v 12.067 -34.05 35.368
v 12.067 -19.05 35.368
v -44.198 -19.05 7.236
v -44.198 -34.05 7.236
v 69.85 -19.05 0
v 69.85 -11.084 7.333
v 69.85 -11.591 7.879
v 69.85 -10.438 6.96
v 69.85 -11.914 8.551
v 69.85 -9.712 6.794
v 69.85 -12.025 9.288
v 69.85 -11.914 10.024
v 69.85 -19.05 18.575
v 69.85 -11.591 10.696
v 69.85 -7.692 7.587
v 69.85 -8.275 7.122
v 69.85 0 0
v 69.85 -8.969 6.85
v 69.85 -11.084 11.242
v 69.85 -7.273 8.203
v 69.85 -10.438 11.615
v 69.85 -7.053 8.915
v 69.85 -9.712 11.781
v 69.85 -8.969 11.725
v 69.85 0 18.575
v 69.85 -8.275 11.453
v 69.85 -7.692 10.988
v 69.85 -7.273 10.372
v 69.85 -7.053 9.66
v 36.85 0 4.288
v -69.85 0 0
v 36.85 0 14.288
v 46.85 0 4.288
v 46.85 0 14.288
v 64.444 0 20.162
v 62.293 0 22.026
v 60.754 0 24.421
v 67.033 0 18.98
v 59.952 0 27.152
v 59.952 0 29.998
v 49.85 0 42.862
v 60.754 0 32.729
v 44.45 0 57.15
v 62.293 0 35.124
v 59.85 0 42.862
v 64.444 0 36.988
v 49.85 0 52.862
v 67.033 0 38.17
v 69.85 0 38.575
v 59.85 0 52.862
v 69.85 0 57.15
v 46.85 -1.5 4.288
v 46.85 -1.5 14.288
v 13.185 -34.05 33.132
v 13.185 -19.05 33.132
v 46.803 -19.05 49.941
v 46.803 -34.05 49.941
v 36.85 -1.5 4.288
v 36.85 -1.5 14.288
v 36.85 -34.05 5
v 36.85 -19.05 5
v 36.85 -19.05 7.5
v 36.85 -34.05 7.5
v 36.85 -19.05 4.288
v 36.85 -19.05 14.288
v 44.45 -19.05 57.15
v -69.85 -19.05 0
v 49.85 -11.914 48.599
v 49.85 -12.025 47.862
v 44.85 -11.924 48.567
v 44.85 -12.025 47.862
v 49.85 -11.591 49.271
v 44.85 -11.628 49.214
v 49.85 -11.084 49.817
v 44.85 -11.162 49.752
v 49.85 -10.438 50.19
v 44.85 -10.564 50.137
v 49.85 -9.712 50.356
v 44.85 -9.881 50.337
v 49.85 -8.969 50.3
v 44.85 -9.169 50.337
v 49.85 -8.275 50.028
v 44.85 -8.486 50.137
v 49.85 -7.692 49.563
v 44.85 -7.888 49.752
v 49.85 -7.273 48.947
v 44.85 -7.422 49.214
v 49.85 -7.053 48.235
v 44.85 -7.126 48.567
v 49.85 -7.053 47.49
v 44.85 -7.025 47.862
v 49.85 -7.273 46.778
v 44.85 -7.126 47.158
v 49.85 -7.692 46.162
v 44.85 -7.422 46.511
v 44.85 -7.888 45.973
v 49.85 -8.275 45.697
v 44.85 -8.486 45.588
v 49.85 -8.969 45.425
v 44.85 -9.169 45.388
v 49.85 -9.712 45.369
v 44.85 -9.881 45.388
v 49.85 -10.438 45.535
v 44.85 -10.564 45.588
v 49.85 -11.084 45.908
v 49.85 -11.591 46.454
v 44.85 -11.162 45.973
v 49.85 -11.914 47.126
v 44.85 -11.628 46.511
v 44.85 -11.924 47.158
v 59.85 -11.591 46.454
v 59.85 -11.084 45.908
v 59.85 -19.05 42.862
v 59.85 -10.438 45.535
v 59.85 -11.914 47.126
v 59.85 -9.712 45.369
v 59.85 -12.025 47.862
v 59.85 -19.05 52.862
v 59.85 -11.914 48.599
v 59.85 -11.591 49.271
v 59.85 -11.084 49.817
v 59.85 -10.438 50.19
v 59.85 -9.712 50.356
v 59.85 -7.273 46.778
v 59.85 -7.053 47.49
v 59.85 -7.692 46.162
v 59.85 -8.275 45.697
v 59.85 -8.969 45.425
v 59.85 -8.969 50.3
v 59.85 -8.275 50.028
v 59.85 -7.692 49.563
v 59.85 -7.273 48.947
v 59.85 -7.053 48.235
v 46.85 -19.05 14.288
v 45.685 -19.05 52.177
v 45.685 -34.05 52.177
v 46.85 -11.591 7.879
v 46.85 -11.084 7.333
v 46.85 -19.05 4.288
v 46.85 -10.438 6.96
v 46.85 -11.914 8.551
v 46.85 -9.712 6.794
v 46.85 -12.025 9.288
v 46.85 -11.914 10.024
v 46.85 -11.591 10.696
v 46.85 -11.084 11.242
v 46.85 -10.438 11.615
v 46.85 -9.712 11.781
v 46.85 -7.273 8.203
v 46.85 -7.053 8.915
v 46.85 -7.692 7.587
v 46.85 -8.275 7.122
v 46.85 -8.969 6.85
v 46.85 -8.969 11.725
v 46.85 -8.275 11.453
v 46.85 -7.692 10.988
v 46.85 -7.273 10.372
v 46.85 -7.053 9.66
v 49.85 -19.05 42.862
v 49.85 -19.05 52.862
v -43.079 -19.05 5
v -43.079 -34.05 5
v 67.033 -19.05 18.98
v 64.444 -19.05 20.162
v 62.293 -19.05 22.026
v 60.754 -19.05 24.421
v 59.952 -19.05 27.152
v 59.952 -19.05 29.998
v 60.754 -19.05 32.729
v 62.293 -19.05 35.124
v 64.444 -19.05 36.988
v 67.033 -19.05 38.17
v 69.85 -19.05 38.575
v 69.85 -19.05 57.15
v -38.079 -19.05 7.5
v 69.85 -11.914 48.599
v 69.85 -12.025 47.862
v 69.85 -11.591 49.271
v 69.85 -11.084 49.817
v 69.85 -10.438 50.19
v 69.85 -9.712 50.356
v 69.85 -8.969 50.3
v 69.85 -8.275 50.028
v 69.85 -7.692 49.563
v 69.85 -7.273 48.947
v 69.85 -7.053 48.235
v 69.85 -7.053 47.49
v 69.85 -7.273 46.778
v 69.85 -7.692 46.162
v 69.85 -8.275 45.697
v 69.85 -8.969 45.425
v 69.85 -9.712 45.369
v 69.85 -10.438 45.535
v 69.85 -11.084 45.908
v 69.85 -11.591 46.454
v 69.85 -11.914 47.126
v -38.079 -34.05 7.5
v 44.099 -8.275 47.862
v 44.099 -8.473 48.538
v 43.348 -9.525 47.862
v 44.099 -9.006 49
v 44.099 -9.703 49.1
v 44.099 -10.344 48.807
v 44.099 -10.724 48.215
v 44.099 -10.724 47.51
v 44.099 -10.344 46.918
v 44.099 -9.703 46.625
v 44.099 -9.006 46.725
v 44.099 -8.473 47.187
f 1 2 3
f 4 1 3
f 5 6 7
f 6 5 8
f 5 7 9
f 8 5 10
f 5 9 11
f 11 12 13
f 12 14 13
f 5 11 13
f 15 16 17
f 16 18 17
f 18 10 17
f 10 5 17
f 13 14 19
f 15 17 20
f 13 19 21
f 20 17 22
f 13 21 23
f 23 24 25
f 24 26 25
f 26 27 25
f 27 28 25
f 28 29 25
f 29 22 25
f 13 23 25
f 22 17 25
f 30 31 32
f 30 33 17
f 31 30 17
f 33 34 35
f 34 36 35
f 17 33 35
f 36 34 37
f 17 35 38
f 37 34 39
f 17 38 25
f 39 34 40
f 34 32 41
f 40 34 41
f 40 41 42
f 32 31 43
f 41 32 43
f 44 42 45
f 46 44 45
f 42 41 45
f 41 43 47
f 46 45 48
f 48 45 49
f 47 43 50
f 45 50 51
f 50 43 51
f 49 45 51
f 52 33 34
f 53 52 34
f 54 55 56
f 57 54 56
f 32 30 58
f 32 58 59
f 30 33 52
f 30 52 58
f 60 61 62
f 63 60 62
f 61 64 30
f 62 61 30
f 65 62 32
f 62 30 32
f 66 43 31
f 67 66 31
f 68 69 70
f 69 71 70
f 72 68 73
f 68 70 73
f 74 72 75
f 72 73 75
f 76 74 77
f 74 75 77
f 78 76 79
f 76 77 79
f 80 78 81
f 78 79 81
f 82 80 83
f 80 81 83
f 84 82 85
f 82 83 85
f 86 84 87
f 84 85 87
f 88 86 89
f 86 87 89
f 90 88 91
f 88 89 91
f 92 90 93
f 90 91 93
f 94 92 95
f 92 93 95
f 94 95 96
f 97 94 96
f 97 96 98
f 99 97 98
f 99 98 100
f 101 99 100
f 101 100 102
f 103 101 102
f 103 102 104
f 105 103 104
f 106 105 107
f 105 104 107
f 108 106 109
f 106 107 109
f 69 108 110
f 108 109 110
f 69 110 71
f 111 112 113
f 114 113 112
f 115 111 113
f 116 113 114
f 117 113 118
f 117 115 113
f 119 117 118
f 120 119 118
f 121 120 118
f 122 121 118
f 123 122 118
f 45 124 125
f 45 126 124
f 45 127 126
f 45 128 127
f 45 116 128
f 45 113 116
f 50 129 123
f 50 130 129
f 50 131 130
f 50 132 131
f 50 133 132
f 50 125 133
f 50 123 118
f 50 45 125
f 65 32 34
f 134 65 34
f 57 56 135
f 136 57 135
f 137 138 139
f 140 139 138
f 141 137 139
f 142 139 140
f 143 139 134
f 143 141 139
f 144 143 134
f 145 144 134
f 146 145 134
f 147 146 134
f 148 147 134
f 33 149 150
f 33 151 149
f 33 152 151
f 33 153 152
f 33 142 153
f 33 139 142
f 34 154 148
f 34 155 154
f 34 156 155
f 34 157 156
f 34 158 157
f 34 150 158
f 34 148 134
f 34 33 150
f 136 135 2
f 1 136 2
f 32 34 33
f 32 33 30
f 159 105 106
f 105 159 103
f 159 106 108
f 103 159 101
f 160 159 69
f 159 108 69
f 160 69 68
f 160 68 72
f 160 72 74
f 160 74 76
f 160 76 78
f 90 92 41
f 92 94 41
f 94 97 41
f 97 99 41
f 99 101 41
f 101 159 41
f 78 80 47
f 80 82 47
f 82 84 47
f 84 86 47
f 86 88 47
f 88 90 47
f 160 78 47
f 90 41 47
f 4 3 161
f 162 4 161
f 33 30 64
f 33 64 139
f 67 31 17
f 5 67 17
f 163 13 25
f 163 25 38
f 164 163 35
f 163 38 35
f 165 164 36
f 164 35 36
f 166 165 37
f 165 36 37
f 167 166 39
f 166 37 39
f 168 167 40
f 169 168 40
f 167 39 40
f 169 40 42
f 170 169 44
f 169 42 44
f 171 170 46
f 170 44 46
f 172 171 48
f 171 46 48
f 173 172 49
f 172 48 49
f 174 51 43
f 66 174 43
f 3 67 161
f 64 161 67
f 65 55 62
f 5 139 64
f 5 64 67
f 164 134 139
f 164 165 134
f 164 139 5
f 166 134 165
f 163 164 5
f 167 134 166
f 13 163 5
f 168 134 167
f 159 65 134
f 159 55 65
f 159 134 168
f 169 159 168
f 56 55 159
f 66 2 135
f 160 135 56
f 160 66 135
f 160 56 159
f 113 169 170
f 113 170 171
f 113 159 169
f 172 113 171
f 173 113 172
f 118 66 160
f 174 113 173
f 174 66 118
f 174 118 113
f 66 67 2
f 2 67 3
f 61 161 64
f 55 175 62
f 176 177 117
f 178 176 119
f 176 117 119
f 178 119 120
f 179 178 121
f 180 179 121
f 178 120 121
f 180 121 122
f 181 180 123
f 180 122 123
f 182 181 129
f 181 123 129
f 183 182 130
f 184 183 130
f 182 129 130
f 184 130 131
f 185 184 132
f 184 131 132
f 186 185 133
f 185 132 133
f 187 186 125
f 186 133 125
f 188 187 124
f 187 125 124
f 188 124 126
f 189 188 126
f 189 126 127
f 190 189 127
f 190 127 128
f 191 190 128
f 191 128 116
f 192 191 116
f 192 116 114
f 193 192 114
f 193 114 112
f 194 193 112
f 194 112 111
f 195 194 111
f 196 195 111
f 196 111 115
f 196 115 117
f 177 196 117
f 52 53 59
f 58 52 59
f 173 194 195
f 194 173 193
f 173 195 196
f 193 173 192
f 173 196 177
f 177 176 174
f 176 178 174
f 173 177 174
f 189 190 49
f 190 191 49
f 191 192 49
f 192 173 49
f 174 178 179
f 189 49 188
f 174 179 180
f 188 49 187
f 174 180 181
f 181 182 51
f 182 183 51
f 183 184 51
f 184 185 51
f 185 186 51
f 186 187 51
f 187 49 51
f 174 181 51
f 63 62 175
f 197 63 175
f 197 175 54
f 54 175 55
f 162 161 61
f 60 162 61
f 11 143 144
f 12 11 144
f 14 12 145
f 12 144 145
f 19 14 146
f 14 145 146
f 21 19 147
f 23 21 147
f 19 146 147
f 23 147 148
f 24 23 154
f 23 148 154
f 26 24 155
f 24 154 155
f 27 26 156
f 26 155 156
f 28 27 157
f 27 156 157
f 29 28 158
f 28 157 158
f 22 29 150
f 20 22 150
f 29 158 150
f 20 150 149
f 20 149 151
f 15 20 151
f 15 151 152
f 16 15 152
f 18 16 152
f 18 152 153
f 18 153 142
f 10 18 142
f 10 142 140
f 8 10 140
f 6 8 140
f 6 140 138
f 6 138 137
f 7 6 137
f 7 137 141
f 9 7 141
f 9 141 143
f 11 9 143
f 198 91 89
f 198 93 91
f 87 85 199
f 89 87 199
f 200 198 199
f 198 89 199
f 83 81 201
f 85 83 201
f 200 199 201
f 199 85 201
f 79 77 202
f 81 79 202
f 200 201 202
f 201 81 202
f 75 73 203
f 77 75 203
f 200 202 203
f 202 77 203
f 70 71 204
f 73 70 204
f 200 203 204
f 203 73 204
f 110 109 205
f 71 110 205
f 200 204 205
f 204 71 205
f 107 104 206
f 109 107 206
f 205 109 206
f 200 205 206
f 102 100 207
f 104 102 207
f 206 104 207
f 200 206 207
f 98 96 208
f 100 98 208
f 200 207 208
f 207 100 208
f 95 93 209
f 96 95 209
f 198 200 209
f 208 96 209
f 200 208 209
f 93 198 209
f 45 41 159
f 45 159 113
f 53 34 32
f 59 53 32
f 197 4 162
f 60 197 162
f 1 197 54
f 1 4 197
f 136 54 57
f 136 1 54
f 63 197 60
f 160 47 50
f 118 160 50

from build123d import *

# Parameters (mm, degrees)
F0_W     = 10
F0_H     = 10
F1_DEPTH = 19.05
F3_DEPTH = 15
F5_D     = 5
F5_DEPTH = 30
F5_TIP   = 1.5021515476
F6_W     = 10
F6_H     = 10
F7_DEPTH = 1.5
F9_D     = 5
F9_DEPTH = 25
F9_TIP   = 1.5021515476


with BuildPart() as f1:
    # F0 (on Front) → F1 (new body)
    with BuildSketch(Plane.XZ):
        with BuildLine():
            Line((44.45, 57.15), (-69.85, 0))
            Line((-69.85, 0), (69.85, 0))
            Line((69.85, 0), (69.85, 18.575))
            ThreePointArc((69.85, 18.575), (59.85, 28.575), (69.85, 38.575))
            Line((69.85, 38.575), (69.85, 57.15))
            Line((69.85, 57.15), (44.45, 57.15))
        make_face()
        with Locations((41.85, 9.2875)):
            Rectangle(F0_W, F0_H, mode=Mode.SUBTRACT)
        with Locations((54.85, 47.8625)):
            Rectangle(F0_W, F0_H, mode=Mode.SUBTRACT)
    extrude(amount=F1_DEPTH)

    # F2 (on face) → F3 (join)
    with BuildSketch(Plane.XZ.offset(19.05)):
        Polygon((45.6853015441, 52.1774808283), (12.0671401638, 35.3684001382), (-44.1975241575, 7.2360679775), (-43.0794901688, 5), (36.85, 5), (36.85, 7.5), (36.7782227695, 7.5), (-38.0794901688, 7.5), (13.1851741526, 33.1323321607), (46.8033355329, 49.9414128508), align=None)
    extrude(amount=F3_DEPTH)

    # F5
    with Locations(Plane.YZ.offset(69.85)):
        with Locations((-9.525, 9.2875)):
            Hole(F5_D / 2, depth=F5_DEPTH)
            with Locations((0, 0, -(F5_DEPTH + F5_TIP / 2))):  # 118° drill point
                Cone(0, F5_D / 2, F5_TIP, mode=Mode.SUBTRACT)

    # F9
    with Locations(Plane.YZ.offset(69.85)):
        with Locations((-9.525, 47.8625)):
            Hole(F9_D / 2, depth=F9_DEPTH)
            with Locations((0, 0, -(F9_DEPTH + F9_TIP / 2))):  # 118° drill point
                Cone(0, F9_D / 2, F9_TIP, mode=Mode.SUBTRACT)


with BuildPart() as f7:
    # F6 (on face) → F7 (new body)
    with BuildSketch(Plane(origin=(0, 0, 0), x_dir=(-1, 0, 0), z_dir=(0, 1, 0))):
        with Locations((-41.85, 9.2875)):
            Rectangle(F6_W, F6_H)
    extrude(amount=-F7_DEPTH)


solid = Compound([f1.part, f7.part])
